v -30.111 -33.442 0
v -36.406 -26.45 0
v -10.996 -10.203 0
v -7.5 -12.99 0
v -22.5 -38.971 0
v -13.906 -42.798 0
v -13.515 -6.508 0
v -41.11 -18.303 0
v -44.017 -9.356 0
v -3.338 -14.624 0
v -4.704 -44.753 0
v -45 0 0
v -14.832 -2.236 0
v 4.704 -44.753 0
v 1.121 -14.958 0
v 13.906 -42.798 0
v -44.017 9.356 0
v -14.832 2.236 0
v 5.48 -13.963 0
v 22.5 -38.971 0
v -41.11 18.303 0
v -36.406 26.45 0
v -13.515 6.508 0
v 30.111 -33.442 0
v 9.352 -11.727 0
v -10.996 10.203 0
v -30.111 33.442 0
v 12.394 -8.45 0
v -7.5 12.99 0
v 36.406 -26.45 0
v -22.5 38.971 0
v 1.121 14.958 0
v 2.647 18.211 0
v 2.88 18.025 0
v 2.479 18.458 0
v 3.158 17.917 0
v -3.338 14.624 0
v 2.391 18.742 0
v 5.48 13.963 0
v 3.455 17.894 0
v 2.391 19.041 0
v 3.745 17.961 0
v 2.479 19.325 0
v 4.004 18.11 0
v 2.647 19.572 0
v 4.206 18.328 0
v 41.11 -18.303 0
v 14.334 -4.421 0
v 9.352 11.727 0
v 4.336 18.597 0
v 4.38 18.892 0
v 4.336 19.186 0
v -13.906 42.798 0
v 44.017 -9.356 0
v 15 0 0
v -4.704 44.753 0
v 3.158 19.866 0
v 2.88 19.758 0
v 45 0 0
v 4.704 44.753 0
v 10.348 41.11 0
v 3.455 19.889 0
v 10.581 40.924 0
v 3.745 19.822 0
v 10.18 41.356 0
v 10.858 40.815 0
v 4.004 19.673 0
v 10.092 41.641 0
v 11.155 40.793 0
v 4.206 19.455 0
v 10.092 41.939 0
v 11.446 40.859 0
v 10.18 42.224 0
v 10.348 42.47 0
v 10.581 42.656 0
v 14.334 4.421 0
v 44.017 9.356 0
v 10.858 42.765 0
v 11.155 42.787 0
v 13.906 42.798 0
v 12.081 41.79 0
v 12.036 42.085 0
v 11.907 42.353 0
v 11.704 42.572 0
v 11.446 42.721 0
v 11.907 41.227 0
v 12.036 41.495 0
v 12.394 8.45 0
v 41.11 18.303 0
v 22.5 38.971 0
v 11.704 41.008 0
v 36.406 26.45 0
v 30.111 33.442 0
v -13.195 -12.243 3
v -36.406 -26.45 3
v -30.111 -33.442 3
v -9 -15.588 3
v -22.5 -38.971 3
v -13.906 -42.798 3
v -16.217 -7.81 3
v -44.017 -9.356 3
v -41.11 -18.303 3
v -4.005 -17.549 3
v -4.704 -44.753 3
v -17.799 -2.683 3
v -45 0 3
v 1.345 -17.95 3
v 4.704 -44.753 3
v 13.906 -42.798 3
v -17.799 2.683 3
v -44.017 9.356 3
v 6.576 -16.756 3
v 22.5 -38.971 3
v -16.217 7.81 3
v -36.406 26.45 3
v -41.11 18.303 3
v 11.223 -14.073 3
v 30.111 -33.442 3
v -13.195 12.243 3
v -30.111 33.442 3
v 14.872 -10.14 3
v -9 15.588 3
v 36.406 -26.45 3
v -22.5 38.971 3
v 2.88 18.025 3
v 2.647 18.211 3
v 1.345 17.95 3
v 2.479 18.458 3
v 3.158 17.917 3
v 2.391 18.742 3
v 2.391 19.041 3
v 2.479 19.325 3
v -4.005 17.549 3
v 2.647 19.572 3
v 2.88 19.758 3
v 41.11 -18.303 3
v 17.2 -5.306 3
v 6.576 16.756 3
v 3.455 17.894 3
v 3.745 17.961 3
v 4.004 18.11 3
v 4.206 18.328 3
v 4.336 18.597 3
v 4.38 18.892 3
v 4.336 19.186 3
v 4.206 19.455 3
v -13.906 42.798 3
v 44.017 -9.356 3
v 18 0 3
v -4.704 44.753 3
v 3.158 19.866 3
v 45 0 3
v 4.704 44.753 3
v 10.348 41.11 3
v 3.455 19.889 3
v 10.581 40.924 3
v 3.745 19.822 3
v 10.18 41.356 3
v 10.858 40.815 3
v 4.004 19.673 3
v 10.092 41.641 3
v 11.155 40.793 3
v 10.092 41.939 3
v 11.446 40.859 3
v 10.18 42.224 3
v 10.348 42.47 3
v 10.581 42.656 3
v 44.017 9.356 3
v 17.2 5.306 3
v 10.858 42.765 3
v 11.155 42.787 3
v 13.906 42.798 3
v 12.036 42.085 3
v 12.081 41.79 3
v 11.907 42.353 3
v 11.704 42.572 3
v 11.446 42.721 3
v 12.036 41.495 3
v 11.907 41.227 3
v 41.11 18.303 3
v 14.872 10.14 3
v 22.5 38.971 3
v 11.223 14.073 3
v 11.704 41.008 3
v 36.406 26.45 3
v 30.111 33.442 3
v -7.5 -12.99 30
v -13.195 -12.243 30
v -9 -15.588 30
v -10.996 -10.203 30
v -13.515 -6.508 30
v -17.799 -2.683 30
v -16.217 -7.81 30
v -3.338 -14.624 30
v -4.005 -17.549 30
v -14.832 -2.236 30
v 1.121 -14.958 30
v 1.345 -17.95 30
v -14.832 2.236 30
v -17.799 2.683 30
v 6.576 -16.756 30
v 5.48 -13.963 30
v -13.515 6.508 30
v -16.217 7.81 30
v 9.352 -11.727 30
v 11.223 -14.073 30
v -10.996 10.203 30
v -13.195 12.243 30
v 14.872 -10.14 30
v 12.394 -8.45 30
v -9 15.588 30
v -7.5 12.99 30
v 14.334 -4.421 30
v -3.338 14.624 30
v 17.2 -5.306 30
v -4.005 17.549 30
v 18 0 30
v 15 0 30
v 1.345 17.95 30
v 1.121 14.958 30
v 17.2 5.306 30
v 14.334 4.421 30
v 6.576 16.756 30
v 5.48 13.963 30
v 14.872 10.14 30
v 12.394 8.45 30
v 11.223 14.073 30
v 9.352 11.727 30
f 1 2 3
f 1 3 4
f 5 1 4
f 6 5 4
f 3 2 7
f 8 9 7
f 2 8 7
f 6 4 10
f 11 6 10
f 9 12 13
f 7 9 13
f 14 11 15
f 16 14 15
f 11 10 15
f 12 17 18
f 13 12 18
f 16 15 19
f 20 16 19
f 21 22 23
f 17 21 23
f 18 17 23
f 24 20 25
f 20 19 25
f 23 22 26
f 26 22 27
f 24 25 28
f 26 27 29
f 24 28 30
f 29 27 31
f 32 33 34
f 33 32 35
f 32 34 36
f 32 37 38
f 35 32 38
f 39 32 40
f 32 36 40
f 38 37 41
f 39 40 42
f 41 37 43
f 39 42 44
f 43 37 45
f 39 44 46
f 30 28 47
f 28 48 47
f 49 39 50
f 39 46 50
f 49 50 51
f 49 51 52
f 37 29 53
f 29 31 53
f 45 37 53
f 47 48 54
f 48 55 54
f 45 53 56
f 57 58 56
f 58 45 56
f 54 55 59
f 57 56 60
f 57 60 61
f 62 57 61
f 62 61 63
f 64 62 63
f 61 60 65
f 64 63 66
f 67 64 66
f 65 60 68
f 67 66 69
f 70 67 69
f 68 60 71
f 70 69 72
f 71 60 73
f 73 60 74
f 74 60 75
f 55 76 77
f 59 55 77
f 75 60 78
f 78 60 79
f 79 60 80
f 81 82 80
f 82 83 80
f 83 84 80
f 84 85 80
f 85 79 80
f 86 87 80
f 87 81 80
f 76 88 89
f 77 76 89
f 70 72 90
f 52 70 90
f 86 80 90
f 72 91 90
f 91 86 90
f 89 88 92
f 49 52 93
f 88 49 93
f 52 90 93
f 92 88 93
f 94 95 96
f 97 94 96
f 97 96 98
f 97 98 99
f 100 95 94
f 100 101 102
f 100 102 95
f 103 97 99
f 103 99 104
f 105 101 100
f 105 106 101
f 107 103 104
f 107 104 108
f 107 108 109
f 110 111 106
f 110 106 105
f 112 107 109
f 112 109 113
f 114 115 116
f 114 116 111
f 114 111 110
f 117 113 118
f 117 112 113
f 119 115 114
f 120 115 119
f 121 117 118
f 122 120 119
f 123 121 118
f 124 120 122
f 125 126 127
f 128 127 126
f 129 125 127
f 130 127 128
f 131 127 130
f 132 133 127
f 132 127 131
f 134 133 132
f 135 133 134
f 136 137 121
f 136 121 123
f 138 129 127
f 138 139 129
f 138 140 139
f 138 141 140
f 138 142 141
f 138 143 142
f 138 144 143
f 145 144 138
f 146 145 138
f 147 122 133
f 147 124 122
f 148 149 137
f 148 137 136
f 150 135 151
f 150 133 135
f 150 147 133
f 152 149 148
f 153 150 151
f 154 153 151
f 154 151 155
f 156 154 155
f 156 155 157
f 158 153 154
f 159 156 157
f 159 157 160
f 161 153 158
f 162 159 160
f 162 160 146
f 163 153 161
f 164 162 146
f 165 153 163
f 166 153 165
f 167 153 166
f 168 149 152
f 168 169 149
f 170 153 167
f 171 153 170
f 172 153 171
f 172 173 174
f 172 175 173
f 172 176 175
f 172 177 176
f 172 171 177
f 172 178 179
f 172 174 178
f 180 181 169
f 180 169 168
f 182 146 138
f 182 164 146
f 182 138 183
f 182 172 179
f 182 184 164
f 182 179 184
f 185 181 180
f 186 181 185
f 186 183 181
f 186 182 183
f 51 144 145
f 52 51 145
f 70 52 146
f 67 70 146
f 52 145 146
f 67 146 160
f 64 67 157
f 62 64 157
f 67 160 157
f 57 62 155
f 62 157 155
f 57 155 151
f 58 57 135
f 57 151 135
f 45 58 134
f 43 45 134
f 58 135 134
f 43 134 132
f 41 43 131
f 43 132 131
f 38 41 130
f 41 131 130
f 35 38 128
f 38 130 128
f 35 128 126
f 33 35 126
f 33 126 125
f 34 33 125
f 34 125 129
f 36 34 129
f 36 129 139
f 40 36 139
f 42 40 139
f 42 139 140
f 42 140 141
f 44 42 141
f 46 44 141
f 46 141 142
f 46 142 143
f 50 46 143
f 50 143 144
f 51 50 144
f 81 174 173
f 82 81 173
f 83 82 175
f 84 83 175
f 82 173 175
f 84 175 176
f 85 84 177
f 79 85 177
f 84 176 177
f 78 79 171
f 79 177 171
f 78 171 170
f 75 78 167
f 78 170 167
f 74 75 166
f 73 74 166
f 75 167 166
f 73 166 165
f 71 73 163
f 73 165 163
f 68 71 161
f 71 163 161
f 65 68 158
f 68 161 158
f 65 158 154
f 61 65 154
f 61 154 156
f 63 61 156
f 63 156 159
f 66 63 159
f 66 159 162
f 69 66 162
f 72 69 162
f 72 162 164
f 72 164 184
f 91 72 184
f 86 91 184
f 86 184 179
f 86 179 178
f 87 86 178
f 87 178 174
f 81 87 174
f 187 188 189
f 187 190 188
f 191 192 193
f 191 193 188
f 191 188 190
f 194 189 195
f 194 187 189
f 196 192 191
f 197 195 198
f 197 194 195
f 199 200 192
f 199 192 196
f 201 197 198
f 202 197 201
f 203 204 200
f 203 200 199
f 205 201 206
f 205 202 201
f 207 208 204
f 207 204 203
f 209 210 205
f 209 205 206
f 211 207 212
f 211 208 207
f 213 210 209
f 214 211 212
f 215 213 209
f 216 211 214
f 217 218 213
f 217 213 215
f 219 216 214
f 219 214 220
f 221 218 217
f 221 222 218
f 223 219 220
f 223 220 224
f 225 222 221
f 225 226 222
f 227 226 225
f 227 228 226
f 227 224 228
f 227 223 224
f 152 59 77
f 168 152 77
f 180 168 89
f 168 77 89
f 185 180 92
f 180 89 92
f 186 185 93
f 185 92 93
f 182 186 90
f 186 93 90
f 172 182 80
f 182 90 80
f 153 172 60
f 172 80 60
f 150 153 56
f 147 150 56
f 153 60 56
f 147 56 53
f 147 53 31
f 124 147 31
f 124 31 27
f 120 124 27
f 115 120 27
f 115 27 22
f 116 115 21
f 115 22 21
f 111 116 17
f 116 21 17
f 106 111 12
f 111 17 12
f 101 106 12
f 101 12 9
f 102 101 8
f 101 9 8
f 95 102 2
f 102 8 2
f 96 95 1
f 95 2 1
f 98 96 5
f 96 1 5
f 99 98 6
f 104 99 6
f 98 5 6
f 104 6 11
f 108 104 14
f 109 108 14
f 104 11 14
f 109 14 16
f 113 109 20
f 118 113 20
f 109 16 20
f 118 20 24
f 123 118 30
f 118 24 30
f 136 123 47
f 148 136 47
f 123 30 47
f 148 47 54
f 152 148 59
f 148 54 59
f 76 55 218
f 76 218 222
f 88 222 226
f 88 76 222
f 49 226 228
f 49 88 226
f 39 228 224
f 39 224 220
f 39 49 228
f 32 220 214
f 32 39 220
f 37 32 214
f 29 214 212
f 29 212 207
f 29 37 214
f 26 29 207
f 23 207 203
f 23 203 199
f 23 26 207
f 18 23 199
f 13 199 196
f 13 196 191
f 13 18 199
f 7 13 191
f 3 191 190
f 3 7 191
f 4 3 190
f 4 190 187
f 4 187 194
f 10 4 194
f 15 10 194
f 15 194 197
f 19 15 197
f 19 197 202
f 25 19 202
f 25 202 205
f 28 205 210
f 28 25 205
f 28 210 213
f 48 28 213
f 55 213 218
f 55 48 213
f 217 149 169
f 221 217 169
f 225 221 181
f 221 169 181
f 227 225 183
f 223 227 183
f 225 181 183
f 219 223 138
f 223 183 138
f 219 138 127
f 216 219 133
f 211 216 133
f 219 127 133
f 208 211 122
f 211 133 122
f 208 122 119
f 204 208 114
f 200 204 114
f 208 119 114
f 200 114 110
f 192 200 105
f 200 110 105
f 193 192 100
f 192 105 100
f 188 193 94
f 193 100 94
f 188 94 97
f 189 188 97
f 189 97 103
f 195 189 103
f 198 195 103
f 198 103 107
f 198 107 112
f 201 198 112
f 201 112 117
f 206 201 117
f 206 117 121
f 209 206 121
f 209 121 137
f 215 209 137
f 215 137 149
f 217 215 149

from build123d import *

# Parameters (mm, degrees)
F0_R     = 18
F0_R_2   = 15
F1_DEPTH = 30
F0_R_3   = 45
F2_DEPTH = 3
F3_R     = 1
F4_DEPTH = 32.8
F5_DEPTH = 25


with BuildPart() as f1:
    # F0 (on Top) → F1 (new body)
    with BuildSketch(Plane.XY):
        Circle(F0_R)
        Circle(F0_R_2, mode=Mode.SUBTRACT)
    extrude(amount=F1_DEPTH)

    # F0 (on Top) → F2 (join)
    with BuildSketch(Plane.XY):
        Circle(F0_R_3)
        Circle(F0_R, mode=Mode.SUBTRACT)
    extrude(amount=F2_DEPTH)

    # F3 (on face) → F4 (cut)
    with BuildSketch(Plane.XY.offset(3)):
        with Locations((3.380115, 18.891523)):
            Circle(F3_R)
    extrude(amount=-F4_DEPTH, mode=Mode.SUBTRACT)

    # F3 (on face) → F5 (cut)
    with BuildSketch(Plane.XY.offset(3)):
        with Locations((3.380115, 18.891523)):
            Circle(F3_R)
        with Locations((11.080593, 41.789821)):
            Circle(F3_R)
    extrude(amount=-F5_DEPTH, mode=Mode.SUBTRACT)


solid = f1.part
